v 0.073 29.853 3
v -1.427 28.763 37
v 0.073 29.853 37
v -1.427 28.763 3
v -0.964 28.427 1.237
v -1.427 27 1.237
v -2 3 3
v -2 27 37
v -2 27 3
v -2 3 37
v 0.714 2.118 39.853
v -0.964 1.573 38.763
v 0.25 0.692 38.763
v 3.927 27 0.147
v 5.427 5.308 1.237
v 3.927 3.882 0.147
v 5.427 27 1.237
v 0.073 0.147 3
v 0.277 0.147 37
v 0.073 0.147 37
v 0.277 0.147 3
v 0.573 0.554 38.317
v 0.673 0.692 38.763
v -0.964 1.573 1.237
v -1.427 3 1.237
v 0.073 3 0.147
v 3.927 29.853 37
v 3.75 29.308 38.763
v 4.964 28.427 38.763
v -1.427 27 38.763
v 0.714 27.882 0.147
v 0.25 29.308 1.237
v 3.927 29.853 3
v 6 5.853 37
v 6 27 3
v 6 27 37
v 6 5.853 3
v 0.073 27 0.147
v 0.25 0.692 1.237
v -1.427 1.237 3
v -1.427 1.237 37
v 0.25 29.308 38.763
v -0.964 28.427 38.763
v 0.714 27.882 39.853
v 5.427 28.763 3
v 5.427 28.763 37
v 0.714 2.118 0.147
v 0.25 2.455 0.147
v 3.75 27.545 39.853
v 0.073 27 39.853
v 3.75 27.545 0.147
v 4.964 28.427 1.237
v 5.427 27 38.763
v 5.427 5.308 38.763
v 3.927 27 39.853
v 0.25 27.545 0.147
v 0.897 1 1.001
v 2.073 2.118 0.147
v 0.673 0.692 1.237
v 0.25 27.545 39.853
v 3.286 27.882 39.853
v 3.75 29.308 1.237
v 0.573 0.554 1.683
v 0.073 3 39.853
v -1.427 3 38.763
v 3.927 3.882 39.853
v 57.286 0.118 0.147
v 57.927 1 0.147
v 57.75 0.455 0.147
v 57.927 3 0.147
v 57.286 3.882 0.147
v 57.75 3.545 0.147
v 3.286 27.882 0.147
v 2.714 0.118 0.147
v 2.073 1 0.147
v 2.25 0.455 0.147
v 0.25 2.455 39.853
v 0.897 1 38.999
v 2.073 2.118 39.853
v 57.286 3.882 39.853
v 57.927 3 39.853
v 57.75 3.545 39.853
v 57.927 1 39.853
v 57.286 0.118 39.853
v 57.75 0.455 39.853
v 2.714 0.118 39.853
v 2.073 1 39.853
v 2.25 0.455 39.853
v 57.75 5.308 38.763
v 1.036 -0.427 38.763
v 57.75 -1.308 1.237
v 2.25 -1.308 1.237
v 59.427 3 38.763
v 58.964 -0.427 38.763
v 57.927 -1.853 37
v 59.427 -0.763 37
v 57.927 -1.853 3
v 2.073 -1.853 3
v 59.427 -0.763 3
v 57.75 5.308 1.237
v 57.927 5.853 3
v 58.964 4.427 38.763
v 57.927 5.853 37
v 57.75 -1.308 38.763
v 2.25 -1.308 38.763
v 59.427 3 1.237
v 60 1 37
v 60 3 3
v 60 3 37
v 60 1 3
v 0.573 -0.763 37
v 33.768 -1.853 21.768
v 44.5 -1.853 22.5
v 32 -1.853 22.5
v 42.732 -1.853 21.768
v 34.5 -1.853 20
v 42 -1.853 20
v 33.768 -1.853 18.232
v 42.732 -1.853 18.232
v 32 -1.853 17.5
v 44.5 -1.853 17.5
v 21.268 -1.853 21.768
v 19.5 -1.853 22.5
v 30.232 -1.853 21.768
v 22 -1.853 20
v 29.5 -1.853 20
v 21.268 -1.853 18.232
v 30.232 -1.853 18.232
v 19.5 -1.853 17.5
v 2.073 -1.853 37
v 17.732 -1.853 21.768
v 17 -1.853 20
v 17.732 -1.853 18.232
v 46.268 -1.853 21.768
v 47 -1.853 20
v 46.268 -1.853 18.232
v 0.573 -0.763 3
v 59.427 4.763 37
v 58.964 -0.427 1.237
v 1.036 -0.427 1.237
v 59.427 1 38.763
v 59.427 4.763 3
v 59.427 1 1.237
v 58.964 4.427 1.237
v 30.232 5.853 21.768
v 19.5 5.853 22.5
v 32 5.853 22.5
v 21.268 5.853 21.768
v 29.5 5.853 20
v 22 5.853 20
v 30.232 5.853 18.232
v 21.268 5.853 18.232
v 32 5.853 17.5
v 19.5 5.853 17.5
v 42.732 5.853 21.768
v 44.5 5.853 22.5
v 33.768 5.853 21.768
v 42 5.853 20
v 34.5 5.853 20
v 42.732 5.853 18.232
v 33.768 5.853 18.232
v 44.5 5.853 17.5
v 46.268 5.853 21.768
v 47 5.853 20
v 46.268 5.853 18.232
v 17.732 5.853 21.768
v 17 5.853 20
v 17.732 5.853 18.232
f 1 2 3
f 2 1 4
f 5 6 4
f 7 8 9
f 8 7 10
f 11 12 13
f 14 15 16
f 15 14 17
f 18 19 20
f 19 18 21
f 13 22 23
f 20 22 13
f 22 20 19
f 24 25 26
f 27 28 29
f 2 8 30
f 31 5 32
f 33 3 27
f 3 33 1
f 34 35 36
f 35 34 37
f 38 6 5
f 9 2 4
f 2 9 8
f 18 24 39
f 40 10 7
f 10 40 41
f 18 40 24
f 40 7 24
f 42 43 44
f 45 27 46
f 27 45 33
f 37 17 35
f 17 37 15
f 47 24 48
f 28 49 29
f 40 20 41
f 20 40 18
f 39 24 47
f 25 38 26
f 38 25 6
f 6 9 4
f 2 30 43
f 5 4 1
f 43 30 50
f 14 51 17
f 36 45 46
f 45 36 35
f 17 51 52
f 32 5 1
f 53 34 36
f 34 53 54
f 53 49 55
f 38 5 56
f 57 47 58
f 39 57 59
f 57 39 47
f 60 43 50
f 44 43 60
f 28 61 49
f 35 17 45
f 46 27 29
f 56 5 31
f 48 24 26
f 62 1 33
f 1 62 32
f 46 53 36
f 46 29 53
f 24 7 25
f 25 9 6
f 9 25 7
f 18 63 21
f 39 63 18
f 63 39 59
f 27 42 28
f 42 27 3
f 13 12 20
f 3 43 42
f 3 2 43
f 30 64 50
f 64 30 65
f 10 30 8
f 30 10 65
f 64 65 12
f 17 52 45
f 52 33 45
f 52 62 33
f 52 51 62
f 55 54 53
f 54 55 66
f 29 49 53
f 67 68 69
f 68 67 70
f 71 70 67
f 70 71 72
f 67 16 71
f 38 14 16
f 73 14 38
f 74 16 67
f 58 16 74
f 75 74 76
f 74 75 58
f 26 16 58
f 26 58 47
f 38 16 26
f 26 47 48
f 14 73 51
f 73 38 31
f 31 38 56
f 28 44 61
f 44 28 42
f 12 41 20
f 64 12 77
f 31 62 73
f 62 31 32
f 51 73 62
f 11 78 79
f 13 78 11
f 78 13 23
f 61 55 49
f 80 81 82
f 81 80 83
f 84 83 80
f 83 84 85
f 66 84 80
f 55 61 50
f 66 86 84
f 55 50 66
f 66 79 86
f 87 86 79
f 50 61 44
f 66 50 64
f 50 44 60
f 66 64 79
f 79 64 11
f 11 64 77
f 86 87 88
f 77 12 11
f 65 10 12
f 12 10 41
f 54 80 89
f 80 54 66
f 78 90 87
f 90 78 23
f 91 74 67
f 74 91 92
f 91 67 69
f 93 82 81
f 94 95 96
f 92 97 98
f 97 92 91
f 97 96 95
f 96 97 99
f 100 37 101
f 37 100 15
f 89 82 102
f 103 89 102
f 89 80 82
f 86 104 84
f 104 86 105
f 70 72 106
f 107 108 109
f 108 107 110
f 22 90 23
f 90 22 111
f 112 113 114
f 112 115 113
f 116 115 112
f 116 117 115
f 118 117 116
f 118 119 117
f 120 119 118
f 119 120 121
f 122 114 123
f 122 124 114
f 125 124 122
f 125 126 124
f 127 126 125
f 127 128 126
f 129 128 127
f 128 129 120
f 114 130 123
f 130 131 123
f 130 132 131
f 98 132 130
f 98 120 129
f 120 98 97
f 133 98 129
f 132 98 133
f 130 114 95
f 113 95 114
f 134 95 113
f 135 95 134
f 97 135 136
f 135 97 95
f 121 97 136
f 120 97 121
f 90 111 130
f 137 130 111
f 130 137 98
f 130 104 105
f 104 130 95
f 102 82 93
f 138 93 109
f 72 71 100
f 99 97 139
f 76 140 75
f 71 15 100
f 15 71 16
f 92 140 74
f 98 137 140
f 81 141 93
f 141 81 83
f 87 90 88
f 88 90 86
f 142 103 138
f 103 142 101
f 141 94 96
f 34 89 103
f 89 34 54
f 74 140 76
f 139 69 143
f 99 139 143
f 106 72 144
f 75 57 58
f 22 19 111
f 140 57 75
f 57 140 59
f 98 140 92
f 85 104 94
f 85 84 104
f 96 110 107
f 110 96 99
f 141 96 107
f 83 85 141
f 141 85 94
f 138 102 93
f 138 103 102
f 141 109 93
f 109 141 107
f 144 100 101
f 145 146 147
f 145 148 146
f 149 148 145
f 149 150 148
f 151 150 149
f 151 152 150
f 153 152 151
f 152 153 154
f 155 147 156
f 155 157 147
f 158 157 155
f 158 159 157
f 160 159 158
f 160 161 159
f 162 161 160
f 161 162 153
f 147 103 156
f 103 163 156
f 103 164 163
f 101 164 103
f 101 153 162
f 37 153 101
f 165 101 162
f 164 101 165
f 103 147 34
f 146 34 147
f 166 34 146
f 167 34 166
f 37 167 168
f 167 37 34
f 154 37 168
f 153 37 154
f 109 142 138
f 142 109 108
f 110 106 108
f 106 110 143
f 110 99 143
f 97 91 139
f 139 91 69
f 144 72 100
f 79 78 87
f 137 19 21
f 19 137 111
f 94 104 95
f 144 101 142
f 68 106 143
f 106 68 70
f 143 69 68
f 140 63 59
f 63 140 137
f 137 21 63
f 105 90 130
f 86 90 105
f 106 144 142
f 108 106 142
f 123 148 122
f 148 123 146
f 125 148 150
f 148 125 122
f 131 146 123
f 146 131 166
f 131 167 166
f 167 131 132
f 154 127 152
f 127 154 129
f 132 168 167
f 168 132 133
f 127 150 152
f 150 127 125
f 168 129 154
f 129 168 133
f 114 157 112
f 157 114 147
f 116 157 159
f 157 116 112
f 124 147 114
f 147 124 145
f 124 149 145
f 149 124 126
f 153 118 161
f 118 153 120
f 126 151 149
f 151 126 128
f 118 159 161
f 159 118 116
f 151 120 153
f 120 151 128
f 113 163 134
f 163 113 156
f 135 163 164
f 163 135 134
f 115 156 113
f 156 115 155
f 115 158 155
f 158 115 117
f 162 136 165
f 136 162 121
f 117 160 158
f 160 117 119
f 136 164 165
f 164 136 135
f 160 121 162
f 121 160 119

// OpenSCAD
// Parametric L-bracket
L = 60; W = 30; T = 4; H1 = 40; H2 = 40; D = 5; N = 3; R = 3;

module rounded_cube(dim, r) {
    hull() {
        for (x = [r, dim[0]-r], y = [r, dim[1]-r], z = [r, dim[2]-r]) {
            translate([x, y, z]) sphere(r=r);
        }
    }
}

module l_bracket() {
    difference() {
        union() {
            rounded_cube([T, W, H1], R);
            rounded_cube([L, T, H2], R);
        }
        spacing = (L - T - 2*R) / (N + 1);
        for (i = [1:N]) {
            x_pos = T + R + i * spacing;
            translate([x_pos, T/2, H1/2])
                rotate([90, 0, 0]) cylinder(d=D, h=W+2, center=true);
        }
    }
}

l_bracket();
